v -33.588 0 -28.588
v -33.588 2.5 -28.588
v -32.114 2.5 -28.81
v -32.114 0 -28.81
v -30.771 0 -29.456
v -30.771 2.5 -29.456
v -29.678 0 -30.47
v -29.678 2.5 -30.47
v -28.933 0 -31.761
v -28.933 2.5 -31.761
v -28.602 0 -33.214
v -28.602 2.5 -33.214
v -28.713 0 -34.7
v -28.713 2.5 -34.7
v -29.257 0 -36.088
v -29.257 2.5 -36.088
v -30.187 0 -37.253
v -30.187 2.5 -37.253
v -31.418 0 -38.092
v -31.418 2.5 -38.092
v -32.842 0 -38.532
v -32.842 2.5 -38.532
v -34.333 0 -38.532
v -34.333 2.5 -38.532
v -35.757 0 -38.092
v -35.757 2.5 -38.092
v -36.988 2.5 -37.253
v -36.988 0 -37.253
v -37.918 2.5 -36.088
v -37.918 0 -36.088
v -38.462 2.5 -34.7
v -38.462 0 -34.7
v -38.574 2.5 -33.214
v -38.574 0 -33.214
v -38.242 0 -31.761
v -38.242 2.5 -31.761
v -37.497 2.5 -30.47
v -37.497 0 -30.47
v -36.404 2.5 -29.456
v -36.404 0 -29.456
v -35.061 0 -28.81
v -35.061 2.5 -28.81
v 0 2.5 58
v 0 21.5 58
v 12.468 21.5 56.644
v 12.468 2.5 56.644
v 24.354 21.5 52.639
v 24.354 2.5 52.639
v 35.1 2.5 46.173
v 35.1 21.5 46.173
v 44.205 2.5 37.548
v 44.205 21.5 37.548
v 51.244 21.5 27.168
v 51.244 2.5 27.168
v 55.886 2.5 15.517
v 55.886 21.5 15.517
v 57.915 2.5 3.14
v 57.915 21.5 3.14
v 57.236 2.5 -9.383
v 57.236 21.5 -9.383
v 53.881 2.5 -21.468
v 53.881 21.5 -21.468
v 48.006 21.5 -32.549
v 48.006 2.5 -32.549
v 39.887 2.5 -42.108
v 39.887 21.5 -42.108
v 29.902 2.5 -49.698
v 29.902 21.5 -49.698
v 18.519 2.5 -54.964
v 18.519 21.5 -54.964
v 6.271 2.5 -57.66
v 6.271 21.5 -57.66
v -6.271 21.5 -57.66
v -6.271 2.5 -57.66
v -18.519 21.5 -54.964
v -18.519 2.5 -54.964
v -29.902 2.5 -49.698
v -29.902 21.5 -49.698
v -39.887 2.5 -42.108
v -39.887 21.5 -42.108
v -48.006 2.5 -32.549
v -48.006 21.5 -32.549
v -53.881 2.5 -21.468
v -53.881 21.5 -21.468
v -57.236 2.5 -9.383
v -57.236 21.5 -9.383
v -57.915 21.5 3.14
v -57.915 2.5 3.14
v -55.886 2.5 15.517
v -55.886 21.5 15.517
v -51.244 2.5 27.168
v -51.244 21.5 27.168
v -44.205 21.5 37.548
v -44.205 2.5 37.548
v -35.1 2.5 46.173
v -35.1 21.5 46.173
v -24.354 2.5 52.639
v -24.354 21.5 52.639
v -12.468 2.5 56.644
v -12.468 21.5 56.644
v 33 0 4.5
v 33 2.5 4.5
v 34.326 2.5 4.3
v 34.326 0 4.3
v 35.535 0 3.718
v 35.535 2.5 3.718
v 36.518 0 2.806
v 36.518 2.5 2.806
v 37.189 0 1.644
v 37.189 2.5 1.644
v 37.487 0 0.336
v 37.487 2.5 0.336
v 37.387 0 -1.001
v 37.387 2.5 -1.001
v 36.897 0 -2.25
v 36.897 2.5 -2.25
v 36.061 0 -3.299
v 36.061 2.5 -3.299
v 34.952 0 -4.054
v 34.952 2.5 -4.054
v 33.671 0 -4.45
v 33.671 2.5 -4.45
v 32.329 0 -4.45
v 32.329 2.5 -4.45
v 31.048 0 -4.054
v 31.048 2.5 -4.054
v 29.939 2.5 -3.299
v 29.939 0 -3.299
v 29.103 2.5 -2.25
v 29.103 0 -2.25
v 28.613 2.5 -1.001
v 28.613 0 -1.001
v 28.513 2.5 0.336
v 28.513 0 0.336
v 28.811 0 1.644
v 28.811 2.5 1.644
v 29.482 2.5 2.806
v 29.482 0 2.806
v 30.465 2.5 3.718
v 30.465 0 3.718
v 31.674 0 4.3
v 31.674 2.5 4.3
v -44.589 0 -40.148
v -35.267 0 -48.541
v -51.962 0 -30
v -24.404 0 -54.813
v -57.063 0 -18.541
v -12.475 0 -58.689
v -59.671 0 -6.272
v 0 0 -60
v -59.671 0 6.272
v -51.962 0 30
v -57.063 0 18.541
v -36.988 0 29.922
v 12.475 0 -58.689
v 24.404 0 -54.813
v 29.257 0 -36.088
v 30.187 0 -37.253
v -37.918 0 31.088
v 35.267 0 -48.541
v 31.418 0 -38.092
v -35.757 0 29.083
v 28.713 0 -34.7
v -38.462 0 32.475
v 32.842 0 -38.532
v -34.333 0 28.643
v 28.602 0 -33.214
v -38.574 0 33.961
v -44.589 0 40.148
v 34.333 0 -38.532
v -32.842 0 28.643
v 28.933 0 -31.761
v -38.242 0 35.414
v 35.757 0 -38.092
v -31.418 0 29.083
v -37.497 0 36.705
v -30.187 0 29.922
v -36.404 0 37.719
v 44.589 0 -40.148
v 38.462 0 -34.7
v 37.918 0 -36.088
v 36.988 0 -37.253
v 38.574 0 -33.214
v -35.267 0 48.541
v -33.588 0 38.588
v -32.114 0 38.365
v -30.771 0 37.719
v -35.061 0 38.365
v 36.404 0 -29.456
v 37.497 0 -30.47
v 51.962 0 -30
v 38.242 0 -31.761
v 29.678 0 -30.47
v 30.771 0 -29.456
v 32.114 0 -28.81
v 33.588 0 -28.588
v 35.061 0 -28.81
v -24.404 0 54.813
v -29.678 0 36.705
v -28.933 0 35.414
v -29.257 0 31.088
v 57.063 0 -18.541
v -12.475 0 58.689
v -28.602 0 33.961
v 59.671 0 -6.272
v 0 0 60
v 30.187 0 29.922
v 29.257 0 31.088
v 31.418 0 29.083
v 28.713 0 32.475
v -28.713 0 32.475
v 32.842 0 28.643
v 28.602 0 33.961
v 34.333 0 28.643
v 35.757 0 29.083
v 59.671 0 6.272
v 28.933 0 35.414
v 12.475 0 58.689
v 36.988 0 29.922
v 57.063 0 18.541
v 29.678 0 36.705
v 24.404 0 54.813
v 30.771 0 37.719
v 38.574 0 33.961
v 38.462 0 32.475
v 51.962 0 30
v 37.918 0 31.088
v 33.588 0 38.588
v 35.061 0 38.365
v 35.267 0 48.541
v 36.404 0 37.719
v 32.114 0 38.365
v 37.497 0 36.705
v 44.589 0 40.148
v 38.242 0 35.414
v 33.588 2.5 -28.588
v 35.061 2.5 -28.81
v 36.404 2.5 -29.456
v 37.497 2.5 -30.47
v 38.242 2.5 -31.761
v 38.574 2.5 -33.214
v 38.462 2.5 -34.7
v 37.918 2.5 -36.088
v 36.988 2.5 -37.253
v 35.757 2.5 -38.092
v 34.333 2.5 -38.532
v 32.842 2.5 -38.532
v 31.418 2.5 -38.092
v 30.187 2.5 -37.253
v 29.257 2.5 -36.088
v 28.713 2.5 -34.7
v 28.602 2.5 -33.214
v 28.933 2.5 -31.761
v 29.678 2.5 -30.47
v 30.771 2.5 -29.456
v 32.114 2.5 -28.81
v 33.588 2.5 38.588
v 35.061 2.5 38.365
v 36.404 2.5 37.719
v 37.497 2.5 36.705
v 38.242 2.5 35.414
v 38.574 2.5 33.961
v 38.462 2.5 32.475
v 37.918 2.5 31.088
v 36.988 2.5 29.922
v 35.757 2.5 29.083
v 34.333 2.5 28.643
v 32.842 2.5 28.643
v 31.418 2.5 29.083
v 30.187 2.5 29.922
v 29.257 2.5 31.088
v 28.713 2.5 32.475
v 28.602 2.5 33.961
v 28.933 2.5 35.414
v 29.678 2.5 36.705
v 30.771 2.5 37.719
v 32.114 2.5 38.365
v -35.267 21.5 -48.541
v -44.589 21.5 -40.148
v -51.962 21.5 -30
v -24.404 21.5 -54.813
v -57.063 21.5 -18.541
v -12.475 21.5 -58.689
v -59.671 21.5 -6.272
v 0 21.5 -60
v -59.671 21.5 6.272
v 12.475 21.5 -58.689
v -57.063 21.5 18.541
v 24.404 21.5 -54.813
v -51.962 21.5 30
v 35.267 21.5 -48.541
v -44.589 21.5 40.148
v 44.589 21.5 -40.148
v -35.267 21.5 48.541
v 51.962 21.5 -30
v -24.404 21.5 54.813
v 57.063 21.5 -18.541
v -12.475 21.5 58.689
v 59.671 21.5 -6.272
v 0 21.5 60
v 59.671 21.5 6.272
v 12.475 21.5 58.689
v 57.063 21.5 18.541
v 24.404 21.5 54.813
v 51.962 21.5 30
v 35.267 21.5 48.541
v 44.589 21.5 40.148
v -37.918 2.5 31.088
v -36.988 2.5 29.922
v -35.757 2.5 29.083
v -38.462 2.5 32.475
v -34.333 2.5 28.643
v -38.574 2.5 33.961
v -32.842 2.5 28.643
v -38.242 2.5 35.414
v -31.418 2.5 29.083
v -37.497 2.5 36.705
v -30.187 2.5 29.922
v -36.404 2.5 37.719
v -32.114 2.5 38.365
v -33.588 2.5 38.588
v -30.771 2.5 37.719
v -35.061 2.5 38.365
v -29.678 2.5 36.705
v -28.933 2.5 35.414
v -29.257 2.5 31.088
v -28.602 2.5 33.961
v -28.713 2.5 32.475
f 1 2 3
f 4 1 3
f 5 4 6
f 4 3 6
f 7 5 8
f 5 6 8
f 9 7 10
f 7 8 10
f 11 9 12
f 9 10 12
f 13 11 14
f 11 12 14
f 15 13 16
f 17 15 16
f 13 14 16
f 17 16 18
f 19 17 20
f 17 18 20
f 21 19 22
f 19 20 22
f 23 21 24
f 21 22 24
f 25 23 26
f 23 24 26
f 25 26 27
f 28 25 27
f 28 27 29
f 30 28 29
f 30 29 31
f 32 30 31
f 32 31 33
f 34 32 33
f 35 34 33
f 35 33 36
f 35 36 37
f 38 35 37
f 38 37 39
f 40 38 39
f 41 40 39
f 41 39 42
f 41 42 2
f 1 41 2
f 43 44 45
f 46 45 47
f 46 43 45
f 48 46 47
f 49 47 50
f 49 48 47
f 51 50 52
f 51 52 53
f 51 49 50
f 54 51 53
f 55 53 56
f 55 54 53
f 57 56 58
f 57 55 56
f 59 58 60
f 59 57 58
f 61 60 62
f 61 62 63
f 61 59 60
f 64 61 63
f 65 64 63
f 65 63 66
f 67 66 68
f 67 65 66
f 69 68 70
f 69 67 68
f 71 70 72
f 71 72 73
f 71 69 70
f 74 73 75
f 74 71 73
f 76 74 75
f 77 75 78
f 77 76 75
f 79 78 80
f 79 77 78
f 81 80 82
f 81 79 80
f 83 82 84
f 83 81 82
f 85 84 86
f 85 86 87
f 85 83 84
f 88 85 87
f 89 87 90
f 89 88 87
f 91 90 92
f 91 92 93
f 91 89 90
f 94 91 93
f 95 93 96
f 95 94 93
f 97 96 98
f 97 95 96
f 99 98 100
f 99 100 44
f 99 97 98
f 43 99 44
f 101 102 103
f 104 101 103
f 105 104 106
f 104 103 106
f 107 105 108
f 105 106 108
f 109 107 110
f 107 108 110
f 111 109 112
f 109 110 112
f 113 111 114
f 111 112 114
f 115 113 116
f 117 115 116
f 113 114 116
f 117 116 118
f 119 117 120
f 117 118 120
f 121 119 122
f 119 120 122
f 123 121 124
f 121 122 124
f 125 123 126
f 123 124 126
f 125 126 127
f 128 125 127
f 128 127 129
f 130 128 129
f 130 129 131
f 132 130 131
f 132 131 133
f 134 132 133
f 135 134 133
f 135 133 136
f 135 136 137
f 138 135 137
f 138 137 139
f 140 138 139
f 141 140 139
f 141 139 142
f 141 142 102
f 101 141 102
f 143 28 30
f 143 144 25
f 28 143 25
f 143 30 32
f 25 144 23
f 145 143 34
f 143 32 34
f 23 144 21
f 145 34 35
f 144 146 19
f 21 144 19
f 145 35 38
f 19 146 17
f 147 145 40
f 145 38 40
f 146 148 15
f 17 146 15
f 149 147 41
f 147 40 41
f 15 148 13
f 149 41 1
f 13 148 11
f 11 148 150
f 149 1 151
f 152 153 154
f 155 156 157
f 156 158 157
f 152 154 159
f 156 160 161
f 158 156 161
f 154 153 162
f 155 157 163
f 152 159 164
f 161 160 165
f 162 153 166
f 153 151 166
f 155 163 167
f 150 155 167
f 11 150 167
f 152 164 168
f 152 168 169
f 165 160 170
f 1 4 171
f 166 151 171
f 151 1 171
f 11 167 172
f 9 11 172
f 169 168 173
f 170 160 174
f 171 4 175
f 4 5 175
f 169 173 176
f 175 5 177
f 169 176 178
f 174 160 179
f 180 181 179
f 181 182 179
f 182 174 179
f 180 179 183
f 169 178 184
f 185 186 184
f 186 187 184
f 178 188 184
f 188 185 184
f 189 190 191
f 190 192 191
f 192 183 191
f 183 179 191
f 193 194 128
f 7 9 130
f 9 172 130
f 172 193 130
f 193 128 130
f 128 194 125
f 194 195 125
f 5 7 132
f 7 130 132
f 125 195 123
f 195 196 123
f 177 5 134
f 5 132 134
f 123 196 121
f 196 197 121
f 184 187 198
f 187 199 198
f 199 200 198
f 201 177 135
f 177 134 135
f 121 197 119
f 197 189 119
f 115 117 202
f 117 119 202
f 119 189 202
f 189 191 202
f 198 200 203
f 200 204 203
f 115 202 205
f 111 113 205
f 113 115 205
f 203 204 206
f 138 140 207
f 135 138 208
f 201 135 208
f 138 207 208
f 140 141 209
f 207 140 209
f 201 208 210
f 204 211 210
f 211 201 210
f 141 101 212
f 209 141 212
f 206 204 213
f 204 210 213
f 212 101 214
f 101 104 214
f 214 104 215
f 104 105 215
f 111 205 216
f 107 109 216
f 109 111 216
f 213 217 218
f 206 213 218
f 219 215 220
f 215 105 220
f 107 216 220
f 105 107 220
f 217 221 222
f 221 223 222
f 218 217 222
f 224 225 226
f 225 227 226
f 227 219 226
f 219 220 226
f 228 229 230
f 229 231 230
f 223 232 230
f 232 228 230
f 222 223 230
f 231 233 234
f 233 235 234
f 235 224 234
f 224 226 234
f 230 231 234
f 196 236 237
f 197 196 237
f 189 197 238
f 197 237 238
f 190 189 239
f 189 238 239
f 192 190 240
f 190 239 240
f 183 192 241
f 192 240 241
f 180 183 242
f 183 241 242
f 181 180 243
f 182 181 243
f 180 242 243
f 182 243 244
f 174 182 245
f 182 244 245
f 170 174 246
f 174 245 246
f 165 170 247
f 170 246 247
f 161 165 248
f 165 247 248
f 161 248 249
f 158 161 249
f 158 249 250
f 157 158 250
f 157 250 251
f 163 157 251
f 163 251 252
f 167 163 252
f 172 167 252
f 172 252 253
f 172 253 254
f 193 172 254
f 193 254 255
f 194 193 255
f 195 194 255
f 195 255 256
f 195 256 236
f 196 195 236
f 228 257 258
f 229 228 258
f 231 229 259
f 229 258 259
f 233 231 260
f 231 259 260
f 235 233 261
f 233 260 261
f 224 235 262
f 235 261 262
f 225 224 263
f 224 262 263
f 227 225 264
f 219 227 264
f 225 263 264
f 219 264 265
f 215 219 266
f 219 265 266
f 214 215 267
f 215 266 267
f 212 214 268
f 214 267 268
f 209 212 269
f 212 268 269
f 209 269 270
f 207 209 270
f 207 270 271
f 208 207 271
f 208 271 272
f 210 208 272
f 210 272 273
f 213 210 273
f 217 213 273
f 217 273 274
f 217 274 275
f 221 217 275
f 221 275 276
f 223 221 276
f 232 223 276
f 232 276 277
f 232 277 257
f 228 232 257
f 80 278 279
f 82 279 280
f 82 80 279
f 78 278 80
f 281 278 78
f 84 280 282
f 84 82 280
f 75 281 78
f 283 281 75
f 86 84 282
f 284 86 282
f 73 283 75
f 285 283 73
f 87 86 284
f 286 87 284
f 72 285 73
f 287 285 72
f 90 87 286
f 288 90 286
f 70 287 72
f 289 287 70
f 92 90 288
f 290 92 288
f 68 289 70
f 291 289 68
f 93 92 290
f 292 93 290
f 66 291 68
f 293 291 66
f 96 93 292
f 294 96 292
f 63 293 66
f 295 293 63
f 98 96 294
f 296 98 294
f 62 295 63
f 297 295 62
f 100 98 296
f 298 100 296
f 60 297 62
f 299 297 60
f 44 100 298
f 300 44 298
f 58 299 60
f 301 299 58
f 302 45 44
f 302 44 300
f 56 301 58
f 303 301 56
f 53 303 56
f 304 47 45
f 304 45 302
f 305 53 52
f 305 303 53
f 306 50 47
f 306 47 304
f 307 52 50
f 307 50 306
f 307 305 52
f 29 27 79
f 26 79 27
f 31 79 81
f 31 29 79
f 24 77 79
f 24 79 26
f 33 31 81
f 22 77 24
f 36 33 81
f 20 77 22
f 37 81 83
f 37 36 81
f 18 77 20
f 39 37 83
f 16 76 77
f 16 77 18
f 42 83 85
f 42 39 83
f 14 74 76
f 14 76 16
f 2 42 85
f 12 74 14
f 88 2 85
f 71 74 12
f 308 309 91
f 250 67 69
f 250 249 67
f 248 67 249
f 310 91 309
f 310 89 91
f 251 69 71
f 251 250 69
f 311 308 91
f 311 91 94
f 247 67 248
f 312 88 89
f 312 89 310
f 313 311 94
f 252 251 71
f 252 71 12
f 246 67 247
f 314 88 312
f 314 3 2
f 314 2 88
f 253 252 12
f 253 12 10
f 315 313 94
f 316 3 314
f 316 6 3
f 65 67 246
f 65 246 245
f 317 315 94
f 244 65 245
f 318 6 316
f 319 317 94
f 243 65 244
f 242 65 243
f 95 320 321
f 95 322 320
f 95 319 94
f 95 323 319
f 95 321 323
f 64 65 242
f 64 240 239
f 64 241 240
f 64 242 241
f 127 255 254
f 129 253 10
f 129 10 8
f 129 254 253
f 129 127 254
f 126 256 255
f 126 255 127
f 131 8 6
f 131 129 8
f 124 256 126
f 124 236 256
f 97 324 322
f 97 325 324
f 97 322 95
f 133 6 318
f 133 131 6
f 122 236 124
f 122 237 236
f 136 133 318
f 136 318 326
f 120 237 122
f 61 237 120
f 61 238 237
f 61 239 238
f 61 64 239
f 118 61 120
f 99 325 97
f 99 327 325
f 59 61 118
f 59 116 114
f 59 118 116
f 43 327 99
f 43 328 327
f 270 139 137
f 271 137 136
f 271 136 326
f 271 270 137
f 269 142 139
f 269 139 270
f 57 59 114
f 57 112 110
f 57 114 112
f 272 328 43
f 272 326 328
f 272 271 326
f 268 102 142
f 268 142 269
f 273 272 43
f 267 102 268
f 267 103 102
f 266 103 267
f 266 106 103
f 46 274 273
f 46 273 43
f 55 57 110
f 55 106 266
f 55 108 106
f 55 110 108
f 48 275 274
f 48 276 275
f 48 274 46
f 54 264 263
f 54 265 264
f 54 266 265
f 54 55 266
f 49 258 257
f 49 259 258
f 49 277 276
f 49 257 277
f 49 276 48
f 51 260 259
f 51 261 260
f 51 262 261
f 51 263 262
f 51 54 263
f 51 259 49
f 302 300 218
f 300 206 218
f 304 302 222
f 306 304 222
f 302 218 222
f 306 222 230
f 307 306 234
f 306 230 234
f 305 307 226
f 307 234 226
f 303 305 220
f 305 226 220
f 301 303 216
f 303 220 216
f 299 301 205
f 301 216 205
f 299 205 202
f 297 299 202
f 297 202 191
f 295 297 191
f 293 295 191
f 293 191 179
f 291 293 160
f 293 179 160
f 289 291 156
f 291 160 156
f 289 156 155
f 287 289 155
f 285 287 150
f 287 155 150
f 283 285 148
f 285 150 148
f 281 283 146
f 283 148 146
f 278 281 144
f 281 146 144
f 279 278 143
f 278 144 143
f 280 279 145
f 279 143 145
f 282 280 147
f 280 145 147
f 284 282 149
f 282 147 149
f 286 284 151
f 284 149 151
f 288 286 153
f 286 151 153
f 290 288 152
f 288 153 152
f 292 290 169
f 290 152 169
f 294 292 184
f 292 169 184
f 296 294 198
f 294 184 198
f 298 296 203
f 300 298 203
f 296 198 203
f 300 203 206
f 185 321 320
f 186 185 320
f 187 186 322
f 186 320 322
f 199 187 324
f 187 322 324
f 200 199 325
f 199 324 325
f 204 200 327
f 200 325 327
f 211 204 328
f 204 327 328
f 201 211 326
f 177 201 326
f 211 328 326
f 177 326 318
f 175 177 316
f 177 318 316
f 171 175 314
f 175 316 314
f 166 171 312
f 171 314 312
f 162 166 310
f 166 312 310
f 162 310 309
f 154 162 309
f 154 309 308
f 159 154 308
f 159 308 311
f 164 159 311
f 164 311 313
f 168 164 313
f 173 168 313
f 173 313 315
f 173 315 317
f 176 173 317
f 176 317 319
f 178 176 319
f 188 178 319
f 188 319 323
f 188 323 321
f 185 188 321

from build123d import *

# Parameters (mm, degrees)
SKETCH1_R           = 60
BOSS_EXTRUDE1_DEPTH = 2.5
SKETCH2_R           = 60
SKETCH2_R_2         = 58
BOSS_EXTRUDE2_DEPTH = 19
SKETCH3_R           = 4.5
SKETCH3_R_2         = 5
CUT_EXTRUDE1_DEPTH  = 87.954010833


with BuildPart() as part:
    # Sketch1 → Boss-Extrude1 (new body)
    with BuildSketch(Plane(origin=(0, 0, 0), x_dir=(1, 0, 0), z_dir=(0, 1, 0))):
        with Locations(Location((0, 0, 0), (0, 0, 270))):
            Circle(SKETCH1_R)
    extrude(amount=BOSS_EXTRUDE1_DEPTH)

    # Sketch2 → Boss-Extrude2 (add)
    with BuildSketch(Plane(origin=(0, 2.5, 0), x_dir=(1, 0, 0), z_dir=(0, 1, 0))):
        with Locations(Location((0, 0, 0), (0, 0, 270))):
            Circle(SKETCH2_R)
        with Locations(Location((0, 0, 0), (0, 0, 270))):
            Circle(SKETCH2_R_2, mode=Mode.SUBTRACT)
    extrude(amount=BOSS_EXTRUDE2_DEPTH)

    # Sketch3 → Cut-Extrude1 (cut, through all)
    with BuildSketch(Plane(origin=(0, 2.5, 0), x_dir=(1, 0, 0), z_dir=(0, 1, 0))):
        with Locations(Location((33, 0, 0), (0, 0, 270))):
            Circle(SKETCH3_R)
        with Locations(Location((33.587572106, 33.587572106, 0), (0, 0, 270))):
            Circle(SKETCH3_R_2)
        with Locations(Location((33.587572106, -33.587572106, 0), (0, 0, 270))):
            Circle(SKETCH3_R_2)
        with Locations(Location((-33.587572106, -33.587572106, 0), (0, 0, 270))):
            Circle(SKETCH3_R_2)
        with Locations(Location((-33.587572106, 33.587572106, 0), (0, 0, 270))):
            Circle(SKETCH3_R_2)
    extrude(amount=-CUT_EXTRUDE1_DEPTH, mode=Mode.SUBTRACT)


solid = part.part
